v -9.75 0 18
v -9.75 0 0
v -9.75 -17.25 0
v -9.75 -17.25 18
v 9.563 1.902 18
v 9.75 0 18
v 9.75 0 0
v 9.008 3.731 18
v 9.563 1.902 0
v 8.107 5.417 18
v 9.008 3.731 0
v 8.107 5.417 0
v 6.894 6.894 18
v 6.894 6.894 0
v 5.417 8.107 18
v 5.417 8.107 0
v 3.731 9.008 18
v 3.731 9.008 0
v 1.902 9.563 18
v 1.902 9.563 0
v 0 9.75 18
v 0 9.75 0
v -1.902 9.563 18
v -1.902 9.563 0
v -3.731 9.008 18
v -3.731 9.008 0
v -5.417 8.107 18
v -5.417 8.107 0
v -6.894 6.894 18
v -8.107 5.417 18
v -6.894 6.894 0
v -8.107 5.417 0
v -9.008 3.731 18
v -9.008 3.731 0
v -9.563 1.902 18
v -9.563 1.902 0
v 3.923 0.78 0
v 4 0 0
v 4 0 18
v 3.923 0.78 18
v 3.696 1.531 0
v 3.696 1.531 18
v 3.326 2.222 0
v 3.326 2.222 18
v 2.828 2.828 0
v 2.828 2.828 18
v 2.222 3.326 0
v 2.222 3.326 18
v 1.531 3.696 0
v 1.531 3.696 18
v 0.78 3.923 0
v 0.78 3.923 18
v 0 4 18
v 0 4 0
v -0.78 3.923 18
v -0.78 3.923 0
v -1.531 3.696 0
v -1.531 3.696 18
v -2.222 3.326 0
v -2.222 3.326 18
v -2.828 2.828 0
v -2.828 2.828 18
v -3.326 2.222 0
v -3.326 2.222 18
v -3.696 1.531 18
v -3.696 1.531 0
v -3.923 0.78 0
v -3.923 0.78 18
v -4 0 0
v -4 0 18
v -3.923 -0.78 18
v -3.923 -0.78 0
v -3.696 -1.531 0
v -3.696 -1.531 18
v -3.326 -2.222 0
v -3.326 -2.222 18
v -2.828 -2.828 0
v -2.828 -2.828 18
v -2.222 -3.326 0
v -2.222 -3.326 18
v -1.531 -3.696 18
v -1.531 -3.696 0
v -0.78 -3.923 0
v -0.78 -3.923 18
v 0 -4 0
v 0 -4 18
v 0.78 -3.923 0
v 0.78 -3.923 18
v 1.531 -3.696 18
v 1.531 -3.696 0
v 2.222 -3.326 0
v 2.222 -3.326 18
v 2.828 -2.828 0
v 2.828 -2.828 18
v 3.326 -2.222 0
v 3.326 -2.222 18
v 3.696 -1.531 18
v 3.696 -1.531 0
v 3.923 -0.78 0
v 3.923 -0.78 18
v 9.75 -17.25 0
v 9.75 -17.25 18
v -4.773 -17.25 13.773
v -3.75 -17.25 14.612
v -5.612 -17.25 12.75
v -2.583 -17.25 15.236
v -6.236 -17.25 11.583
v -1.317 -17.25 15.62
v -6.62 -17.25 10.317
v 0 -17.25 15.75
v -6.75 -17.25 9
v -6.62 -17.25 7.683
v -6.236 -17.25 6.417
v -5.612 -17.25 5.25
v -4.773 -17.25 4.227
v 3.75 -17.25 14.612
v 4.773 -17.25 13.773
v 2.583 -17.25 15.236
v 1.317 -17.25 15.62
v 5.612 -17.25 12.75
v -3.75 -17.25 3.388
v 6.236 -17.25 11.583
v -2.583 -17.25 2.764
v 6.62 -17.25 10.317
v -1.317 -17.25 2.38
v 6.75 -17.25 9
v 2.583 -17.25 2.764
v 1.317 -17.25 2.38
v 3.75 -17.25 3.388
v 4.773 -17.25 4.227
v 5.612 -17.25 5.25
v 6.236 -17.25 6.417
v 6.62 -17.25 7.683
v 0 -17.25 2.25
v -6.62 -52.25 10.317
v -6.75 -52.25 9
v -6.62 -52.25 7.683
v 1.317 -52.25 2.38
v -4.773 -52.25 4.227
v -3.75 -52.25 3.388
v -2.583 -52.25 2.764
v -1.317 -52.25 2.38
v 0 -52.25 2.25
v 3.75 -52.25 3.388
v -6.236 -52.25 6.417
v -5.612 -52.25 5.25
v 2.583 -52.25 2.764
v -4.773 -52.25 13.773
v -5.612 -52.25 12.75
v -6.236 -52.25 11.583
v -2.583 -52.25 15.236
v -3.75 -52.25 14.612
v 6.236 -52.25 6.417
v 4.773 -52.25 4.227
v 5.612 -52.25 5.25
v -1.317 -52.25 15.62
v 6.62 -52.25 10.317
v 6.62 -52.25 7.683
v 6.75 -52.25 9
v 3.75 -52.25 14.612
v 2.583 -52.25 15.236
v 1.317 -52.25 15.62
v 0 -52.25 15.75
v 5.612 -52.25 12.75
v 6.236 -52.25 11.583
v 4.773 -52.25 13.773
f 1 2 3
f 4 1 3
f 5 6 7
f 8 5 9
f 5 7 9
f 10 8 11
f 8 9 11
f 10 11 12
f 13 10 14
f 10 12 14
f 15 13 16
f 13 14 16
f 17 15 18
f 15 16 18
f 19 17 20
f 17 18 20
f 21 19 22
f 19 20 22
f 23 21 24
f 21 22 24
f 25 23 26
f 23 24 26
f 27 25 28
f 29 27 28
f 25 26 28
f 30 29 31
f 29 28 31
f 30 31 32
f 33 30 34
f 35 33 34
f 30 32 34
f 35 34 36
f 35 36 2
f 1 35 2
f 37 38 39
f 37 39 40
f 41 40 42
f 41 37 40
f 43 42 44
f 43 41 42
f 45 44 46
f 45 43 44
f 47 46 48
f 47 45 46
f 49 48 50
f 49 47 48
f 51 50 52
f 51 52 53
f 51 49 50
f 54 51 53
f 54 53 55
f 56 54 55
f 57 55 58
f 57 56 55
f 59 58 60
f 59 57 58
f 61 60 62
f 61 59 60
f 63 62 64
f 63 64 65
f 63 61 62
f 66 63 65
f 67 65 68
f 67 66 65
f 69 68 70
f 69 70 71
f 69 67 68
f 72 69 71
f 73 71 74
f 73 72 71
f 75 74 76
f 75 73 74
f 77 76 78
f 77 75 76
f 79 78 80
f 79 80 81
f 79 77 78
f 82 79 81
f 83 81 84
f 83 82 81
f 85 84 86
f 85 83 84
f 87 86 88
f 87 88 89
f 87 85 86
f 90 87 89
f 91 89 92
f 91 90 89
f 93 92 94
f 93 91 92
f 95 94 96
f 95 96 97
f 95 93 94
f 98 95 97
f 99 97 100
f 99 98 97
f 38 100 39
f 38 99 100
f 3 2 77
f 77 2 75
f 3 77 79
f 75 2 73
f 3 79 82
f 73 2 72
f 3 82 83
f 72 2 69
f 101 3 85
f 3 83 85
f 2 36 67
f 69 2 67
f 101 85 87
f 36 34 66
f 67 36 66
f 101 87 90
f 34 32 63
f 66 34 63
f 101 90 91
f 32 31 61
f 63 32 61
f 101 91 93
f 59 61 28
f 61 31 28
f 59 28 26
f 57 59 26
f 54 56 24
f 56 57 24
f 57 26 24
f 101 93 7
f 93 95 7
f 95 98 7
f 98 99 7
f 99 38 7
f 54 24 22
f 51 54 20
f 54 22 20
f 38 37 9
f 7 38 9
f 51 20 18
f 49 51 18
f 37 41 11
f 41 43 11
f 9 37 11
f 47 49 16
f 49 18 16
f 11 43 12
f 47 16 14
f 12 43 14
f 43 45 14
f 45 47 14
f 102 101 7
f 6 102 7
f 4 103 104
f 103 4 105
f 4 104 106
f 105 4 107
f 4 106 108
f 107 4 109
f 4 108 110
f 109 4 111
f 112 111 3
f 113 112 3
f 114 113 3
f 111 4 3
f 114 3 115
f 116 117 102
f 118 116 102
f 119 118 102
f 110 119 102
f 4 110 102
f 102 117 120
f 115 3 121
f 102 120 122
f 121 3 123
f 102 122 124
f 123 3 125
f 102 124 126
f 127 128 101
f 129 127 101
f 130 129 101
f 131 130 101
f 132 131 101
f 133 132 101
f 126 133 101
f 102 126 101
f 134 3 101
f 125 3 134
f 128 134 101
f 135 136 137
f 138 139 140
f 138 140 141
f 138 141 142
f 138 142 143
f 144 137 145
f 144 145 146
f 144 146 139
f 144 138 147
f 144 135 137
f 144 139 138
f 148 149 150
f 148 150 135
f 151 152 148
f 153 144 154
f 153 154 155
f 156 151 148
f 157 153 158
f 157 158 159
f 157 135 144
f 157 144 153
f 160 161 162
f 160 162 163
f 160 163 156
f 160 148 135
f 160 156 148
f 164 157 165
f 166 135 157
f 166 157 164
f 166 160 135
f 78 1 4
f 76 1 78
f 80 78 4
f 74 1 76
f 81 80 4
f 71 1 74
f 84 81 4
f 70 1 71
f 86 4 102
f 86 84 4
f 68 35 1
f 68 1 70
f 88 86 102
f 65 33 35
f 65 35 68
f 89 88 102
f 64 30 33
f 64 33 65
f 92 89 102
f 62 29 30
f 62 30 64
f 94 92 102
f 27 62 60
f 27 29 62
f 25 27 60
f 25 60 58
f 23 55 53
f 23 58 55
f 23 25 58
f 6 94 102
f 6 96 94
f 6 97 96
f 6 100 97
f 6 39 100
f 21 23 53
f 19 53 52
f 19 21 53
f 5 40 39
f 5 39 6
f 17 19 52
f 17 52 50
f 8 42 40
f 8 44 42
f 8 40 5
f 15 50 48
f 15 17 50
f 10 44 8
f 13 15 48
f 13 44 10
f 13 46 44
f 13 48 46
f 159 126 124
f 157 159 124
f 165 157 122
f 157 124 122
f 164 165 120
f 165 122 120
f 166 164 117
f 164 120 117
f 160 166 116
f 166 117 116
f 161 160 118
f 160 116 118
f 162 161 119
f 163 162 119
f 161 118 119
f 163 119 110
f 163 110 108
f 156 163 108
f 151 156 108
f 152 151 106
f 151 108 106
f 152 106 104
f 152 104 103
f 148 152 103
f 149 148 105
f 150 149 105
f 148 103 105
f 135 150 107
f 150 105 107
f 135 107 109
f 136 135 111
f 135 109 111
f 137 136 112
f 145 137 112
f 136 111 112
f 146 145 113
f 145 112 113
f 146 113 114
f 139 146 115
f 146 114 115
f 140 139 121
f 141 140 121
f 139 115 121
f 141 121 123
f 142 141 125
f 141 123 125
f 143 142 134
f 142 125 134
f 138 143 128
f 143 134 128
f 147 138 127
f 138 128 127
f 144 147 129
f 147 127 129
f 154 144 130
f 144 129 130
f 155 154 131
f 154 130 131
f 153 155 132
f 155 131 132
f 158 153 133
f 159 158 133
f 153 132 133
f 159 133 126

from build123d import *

# Parameters (mm, degrees)
SKETCH1_R           = 4
BOSS_EXTRUDE2_DEPTH = 18
SKETCH2_R           = 6.75
BOSS_EXTRUDE3_DEPTH = 35


with BuildPart() as part:
    # Sketch1 → Boss-Extrude2 (new body)
    with BuildSketch(Plane.XY):
        with BuildLine():
            Line((-9.75, 0), (-9.75, -17.25))
            Line((-9.75, -17.25), (9.75, -17.25))
            Line((9.75, -17.25), (9.75, 0))
            ThreePointArc((9.75, 0), (0, 9.75), (-9.75, 0))
        make_face()
        Circle(SKETCH1_R, mode=Mode.SUBTRACT)
    extrude(amount=BOSS_EXTRUDE2_DEPTH)

    # Sketch2 → Boss-Extrude3 (add)
    with BuildSketch(Plane.XZ.offset(17.25)):
        with Locations((0, 9)):
            Circle(SKETCH2_R)
    extrude(amount=BOSS_EXTRUDE3_DEPTH)


solid = part.part
